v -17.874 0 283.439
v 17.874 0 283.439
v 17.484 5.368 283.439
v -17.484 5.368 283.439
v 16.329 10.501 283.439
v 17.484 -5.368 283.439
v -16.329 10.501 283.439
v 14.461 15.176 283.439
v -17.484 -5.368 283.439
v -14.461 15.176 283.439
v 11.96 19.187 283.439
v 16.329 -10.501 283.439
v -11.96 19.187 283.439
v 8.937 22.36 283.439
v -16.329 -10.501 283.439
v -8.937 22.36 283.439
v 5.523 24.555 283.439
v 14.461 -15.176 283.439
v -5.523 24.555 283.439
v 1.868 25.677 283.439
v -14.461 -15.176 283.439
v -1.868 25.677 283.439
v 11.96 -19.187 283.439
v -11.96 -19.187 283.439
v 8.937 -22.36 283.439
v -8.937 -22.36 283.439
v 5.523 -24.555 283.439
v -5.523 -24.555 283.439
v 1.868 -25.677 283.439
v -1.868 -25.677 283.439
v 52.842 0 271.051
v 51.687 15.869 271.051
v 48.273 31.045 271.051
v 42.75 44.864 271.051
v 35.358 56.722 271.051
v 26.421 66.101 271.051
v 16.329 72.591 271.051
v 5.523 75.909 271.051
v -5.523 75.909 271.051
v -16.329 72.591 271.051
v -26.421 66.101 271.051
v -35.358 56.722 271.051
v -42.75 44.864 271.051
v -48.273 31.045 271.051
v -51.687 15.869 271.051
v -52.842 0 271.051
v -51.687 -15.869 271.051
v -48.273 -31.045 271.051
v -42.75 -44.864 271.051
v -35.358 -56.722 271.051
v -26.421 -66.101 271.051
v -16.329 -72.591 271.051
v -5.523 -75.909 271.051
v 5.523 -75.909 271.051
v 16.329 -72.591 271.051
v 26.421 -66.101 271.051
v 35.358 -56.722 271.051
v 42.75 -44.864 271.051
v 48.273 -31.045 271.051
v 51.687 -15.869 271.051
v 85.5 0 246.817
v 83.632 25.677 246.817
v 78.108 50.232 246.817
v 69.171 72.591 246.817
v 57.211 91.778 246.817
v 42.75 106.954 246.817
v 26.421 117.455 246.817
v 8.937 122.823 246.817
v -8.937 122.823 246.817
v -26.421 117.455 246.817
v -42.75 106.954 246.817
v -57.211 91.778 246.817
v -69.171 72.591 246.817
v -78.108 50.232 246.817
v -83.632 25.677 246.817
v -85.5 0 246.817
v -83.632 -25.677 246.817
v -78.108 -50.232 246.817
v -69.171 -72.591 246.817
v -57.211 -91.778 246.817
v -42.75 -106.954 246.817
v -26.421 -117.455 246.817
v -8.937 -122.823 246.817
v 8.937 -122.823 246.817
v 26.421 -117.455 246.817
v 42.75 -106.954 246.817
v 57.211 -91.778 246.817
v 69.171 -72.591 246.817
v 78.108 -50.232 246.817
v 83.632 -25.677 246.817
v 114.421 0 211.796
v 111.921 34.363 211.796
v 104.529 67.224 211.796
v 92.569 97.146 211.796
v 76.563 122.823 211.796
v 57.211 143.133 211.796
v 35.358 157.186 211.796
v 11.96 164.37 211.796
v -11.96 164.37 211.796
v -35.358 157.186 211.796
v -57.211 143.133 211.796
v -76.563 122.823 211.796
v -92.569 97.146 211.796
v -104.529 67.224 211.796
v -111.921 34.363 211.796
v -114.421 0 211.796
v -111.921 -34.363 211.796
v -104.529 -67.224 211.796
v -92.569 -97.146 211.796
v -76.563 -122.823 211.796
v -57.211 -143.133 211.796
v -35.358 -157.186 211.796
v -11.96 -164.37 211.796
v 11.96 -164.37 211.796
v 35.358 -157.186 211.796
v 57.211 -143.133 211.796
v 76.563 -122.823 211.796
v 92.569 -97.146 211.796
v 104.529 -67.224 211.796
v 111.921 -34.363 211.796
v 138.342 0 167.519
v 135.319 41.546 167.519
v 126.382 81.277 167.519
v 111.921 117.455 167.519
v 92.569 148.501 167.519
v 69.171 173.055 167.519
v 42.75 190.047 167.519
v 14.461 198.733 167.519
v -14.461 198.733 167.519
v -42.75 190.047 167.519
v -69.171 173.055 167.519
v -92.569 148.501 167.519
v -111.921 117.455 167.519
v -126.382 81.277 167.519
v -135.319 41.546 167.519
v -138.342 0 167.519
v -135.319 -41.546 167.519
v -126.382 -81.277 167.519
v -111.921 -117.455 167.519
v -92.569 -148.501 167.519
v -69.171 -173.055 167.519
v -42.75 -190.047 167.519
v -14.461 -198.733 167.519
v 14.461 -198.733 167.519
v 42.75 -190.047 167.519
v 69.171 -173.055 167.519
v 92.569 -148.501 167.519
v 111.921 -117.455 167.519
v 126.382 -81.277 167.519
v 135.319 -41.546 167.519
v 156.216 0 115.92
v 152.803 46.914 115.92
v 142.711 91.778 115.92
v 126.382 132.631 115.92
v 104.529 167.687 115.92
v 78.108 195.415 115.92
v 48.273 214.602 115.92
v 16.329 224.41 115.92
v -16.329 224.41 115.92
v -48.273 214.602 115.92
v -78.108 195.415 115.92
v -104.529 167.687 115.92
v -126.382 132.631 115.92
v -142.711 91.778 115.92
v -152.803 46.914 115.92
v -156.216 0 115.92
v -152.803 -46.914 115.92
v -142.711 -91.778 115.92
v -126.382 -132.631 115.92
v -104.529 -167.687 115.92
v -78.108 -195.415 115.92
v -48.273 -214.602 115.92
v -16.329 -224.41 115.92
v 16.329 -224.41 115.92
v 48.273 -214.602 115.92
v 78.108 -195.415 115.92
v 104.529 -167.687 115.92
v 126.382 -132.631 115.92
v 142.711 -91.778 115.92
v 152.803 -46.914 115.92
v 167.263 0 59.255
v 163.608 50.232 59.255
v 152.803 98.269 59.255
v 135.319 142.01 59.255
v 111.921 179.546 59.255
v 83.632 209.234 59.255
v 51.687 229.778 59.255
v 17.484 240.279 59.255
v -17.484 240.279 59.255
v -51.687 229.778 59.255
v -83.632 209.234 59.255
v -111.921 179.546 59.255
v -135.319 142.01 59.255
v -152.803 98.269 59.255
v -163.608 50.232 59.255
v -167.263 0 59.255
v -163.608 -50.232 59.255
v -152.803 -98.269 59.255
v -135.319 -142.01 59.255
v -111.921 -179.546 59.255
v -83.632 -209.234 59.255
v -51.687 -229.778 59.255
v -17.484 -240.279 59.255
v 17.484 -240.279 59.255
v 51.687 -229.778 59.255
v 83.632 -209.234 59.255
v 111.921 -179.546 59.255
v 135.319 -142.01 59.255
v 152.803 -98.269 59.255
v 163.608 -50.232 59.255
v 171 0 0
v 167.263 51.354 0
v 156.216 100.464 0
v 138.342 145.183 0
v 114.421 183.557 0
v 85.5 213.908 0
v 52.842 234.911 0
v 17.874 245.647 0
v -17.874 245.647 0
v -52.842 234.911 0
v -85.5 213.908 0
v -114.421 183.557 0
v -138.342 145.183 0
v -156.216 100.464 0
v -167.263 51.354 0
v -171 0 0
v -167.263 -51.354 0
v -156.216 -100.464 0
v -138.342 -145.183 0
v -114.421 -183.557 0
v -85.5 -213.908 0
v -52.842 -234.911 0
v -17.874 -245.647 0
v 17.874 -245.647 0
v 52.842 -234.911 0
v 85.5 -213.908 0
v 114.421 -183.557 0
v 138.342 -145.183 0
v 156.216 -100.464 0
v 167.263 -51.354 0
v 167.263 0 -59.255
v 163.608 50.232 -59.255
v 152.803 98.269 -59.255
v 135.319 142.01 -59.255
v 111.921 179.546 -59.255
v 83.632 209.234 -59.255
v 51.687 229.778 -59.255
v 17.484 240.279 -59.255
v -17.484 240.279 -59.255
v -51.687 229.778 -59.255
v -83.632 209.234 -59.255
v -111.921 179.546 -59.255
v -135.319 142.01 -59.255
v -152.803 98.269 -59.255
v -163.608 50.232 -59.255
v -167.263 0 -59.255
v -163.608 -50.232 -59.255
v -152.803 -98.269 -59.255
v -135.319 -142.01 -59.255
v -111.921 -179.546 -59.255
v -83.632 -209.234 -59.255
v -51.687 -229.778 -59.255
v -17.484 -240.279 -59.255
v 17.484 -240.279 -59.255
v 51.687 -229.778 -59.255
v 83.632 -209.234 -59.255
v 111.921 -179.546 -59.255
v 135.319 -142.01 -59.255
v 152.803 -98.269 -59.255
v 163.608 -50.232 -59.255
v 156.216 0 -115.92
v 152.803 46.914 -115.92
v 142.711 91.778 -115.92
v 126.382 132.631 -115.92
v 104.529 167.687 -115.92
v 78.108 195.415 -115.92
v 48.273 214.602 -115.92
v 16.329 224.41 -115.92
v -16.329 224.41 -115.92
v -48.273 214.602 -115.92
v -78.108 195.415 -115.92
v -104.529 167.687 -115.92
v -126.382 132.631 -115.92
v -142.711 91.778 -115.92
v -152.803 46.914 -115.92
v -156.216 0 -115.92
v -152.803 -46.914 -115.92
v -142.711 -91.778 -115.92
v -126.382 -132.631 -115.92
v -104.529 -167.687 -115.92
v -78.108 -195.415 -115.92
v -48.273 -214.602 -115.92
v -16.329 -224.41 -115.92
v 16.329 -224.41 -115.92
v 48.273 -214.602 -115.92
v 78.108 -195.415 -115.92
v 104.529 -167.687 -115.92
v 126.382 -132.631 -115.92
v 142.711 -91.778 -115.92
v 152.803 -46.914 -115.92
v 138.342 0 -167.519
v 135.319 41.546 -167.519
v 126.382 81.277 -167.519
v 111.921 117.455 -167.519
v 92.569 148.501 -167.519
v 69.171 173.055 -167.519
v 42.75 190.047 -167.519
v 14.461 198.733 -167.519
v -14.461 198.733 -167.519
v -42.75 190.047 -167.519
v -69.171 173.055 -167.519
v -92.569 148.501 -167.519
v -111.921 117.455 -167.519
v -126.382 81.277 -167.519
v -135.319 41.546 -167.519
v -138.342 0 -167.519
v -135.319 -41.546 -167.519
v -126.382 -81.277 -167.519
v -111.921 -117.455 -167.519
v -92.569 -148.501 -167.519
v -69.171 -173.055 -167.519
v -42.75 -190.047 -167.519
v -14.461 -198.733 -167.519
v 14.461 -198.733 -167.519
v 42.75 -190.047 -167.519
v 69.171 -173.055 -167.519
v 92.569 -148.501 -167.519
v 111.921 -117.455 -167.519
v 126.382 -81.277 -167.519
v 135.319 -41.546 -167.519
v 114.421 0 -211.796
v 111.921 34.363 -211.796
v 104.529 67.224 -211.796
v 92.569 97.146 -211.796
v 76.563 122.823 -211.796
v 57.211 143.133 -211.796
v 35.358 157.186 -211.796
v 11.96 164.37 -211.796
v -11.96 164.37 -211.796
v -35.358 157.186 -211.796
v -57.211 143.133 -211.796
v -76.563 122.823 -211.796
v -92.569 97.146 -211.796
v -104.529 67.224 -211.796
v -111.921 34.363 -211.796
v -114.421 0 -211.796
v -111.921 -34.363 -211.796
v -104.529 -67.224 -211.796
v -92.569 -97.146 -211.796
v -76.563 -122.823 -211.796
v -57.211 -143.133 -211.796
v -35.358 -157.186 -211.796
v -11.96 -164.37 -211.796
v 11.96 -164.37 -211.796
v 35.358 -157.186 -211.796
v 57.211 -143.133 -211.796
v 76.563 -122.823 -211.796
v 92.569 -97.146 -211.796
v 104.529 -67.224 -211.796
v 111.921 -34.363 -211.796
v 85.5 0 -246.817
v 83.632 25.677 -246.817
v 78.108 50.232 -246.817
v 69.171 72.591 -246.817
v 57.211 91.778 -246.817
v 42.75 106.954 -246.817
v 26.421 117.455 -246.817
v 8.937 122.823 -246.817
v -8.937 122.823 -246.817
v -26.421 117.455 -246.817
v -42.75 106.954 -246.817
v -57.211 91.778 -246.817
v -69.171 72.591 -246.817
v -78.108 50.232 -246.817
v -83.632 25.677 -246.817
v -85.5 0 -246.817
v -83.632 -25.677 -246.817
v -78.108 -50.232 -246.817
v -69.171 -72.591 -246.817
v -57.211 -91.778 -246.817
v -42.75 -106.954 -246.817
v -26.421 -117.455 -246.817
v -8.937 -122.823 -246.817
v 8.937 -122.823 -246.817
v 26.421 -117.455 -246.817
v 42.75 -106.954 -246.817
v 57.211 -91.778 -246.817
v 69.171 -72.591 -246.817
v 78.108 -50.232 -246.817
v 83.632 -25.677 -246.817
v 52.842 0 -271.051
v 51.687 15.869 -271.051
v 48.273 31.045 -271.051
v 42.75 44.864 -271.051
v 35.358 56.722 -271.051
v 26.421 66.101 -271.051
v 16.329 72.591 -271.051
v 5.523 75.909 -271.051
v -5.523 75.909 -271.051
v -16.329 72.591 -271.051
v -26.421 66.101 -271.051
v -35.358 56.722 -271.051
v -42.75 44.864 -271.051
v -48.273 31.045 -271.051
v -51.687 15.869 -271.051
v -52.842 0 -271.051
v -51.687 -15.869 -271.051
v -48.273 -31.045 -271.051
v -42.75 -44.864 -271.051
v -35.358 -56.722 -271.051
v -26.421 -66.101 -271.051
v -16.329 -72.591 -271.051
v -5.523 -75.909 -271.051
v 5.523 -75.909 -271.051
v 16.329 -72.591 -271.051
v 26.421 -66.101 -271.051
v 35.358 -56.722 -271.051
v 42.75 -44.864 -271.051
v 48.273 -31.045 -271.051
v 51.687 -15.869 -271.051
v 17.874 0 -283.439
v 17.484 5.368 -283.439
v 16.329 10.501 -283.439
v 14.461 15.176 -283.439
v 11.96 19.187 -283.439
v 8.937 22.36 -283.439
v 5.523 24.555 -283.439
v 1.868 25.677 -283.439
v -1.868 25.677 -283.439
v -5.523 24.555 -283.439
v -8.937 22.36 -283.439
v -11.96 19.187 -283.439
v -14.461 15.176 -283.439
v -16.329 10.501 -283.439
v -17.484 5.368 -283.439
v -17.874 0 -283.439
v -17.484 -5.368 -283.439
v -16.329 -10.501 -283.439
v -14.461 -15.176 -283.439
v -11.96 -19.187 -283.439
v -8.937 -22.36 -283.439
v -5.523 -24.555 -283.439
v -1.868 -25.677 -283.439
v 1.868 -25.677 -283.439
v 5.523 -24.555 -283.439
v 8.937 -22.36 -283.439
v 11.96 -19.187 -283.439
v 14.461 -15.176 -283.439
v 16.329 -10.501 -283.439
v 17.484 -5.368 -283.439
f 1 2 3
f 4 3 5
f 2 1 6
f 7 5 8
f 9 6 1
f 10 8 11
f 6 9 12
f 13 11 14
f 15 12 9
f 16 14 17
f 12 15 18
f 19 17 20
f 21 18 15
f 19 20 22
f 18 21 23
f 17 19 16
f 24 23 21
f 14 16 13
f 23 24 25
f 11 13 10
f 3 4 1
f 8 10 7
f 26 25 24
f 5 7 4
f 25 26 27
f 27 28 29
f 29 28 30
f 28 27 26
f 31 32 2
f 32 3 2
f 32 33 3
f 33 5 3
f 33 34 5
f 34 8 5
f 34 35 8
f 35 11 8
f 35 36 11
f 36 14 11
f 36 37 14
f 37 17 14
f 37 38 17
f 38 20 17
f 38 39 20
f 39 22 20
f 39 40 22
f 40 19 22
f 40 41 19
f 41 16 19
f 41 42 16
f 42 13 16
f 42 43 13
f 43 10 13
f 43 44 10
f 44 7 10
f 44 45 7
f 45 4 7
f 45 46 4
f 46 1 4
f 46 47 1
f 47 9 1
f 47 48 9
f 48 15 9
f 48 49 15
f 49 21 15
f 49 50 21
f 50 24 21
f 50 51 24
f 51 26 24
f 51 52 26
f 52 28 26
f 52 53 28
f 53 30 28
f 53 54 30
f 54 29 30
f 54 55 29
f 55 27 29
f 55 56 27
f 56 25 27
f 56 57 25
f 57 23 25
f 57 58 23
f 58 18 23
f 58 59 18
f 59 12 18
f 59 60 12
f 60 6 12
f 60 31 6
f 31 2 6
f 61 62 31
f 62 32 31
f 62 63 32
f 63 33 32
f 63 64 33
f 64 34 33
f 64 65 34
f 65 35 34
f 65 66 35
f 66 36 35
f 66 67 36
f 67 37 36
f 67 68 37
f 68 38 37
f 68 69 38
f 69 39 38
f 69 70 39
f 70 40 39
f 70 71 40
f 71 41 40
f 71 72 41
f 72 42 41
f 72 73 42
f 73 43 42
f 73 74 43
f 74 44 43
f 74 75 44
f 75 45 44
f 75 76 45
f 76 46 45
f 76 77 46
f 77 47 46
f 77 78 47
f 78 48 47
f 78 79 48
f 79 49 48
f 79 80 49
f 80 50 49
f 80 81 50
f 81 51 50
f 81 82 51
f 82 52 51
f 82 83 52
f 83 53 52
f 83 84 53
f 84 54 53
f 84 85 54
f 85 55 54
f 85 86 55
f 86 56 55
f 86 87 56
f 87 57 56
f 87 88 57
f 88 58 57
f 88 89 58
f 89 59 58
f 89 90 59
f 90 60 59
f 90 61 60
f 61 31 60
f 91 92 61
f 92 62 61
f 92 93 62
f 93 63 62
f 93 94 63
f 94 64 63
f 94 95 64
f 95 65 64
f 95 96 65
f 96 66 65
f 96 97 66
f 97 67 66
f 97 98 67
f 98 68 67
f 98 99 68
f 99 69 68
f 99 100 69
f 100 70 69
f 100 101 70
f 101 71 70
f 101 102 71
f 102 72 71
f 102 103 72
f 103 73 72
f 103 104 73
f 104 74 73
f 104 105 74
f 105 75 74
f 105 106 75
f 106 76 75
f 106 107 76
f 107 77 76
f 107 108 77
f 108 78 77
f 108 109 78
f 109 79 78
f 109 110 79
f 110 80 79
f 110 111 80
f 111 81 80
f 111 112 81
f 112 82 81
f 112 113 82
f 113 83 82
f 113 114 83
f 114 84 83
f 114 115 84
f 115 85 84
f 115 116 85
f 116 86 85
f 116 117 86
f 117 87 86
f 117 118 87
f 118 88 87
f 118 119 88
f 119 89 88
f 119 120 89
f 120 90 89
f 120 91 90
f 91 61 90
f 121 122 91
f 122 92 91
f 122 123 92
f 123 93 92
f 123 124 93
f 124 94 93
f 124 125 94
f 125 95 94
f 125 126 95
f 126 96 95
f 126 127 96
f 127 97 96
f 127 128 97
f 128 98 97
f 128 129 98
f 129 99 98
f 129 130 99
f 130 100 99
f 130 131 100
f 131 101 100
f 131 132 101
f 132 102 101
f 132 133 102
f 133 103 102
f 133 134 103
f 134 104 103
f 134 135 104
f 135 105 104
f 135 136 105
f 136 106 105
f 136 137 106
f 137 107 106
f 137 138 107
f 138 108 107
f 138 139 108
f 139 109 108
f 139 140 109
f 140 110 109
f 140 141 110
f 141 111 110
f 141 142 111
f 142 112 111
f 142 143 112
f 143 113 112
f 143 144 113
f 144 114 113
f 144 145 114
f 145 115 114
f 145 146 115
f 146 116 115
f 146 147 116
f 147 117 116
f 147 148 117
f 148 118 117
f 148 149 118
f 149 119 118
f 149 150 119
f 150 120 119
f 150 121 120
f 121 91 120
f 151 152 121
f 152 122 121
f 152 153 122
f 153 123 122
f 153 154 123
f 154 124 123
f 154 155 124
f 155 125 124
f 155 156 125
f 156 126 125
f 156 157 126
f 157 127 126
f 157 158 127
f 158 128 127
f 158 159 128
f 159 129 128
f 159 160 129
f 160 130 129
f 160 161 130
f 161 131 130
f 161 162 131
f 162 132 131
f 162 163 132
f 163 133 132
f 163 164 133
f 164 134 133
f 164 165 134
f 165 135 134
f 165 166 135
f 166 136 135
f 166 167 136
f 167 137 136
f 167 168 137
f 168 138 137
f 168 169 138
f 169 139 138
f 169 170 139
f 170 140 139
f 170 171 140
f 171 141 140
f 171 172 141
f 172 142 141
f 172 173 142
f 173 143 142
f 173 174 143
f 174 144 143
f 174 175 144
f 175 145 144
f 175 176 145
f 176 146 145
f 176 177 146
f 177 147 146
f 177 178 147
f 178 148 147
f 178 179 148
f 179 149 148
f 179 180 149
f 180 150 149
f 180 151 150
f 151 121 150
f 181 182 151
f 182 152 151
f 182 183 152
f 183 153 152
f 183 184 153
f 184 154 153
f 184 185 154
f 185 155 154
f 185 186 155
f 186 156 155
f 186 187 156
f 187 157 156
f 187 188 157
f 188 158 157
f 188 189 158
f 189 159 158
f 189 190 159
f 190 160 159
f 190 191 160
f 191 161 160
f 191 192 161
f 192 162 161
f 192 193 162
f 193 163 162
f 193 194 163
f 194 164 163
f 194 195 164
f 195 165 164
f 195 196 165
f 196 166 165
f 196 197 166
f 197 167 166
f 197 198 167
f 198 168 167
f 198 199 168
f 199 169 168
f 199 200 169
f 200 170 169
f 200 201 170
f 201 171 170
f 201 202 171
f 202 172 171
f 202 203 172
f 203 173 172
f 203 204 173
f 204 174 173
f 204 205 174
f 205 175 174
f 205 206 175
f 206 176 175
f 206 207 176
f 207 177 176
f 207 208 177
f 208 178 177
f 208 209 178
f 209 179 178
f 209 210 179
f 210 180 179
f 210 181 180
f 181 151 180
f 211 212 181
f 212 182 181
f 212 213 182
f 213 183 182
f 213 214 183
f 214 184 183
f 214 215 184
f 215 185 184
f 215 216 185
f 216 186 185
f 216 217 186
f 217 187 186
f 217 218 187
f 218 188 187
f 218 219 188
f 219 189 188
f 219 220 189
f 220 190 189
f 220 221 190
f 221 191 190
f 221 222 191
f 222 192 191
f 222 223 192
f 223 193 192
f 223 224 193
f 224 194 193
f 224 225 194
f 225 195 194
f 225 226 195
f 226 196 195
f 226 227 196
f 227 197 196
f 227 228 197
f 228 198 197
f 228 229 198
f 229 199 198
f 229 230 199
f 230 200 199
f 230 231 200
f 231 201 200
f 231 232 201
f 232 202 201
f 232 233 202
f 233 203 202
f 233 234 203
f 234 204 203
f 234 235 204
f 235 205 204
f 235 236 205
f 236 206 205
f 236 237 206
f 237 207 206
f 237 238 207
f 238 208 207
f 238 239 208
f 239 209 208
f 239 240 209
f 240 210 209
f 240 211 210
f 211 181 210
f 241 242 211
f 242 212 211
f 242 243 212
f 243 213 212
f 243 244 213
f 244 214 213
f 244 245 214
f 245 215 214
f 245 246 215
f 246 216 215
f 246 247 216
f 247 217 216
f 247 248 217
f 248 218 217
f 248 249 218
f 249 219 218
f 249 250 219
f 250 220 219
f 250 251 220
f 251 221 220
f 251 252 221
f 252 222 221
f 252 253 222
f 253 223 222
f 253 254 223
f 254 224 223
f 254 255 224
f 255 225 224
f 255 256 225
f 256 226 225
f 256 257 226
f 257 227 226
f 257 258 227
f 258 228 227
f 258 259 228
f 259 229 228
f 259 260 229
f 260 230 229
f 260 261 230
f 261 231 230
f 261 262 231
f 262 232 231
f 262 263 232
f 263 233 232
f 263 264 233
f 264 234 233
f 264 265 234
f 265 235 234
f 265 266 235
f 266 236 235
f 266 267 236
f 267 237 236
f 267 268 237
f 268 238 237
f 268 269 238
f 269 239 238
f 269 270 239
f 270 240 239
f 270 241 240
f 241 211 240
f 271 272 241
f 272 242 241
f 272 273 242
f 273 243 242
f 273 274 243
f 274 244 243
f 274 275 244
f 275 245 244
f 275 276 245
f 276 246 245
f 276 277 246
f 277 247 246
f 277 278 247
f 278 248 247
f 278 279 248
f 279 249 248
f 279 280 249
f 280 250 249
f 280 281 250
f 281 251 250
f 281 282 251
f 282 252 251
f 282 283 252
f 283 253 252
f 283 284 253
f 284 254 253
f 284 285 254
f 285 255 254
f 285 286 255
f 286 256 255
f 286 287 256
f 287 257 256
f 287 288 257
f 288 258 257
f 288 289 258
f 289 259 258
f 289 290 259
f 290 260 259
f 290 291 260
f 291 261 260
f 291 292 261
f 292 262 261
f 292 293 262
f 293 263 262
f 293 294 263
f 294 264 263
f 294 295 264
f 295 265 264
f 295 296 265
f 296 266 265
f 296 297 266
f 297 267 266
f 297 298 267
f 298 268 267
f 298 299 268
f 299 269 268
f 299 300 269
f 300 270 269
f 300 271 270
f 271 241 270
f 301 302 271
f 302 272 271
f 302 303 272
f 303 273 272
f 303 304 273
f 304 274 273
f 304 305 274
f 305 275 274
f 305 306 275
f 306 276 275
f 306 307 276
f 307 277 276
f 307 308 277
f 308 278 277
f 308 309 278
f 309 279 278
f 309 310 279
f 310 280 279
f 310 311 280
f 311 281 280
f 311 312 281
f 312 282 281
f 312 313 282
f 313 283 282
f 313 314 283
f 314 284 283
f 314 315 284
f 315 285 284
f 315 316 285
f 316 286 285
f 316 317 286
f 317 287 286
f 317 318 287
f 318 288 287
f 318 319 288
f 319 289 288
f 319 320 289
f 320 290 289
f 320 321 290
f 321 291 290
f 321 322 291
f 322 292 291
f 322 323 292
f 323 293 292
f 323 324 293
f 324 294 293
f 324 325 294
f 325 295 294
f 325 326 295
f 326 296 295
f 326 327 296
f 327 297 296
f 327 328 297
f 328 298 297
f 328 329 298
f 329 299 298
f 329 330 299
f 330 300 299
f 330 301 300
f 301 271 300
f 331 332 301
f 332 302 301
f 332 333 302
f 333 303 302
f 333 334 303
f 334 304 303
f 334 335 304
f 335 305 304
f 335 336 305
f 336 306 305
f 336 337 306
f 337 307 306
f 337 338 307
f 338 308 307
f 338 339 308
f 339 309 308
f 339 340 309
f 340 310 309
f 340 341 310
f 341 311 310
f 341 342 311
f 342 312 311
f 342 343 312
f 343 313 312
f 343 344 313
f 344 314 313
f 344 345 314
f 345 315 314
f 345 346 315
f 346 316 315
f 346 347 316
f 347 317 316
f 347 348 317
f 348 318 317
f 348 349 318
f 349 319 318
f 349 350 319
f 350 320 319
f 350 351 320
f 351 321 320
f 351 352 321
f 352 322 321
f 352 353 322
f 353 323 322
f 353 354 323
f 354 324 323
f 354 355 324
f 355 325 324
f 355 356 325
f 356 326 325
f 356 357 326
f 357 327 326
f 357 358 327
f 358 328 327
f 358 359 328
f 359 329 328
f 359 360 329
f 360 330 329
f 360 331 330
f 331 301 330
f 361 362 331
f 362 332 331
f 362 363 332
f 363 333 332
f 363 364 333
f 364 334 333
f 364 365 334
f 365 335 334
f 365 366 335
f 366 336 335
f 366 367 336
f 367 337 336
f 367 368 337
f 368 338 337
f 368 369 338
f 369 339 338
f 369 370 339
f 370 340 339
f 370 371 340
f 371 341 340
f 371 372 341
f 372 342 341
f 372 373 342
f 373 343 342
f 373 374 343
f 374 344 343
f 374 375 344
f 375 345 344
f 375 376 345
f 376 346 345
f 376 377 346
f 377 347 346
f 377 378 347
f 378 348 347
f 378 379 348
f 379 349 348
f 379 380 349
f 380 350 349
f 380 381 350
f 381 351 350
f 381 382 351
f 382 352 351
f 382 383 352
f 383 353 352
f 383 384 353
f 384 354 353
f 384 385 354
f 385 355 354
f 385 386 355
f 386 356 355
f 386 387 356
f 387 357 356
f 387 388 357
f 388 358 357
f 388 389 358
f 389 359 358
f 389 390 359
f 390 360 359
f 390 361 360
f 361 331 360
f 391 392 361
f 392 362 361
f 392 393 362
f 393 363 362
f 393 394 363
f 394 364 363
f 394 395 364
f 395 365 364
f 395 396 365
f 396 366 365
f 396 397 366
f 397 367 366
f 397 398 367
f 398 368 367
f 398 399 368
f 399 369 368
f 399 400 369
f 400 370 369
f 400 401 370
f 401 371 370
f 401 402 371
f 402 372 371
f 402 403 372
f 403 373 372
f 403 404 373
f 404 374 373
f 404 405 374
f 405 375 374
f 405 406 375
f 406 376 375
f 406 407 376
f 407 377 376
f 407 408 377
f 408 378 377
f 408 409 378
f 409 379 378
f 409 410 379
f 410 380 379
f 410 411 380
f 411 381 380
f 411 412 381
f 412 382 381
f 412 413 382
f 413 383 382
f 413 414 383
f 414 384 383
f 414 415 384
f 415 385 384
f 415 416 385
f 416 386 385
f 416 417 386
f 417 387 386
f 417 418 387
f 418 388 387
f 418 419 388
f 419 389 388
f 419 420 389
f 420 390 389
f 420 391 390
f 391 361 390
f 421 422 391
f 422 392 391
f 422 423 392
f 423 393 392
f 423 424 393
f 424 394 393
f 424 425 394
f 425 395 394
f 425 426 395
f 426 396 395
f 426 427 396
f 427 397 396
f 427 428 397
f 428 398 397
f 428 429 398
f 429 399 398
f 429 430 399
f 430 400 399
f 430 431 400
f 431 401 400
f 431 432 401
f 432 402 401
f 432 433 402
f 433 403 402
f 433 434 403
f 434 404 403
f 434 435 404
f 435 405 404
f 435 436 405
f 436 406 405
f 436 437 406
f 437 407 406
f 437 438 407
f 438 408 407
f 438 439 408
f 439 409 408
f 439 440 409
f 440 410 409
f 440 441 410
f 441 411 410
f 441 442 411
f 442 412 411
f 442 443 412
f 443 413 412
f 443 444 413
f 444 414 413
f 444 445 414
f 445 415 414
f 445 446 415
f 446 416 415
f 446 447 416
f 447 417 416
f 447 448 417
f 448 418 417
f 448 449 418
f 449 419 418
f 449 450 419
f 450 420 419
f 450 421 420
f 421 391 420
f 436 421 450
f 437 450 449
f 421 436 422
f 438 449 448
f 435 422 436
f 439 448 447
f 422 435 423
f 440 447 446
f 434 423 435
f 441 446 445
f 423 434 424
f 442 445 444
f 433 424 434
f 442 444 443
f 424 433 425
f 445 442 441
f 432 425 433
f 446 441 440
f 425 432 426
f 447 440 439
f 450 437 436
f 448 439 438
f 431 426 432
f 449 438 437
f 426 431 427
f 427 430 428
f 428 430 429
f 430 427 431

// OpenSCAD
// Generated by SolidPython 1.0.1 on 2020-07-29 00:39:26


scale(v = [9, 13, 15]) {
	sphere(r = 19);
}
/***********************************************
*********      SolidPython code:      **********
************************************************
 
# import packages: SolidPython
from solid import *
from solid.utils import *
from itertools import chain, combinations


class Resize:

    def __init__(self, scad_file):
        self.scad_file = scad_file
        #self.scad_file = import_scad(scad_file)
        # cone/cylinder param:
        self.r1 = 0
        self.r2 = 0
        self.h = 0
        # rectangular prism param:
        self.w = 0
        self.l = 0
        # ellipse param:
        self.r = 0

    # import OpenScad code (file name corresponds to shape)


    # classify shape + parameters
    def assign(self, param1, param2, param3):
        if self.scad_file == 'cone.scad':
            self.r1 = param1
            self.r2 = param2
            self.h = param3
        elif self.scad_file == 'cylinder.scad':
            self.r1 = param1
            self.r2 = param2
            self.h = param3
        elif self.scad_file == 'rectangularPrism.scad':
            self.h = param1
            self.l = param2
            self.w = param3
        else:
            self.r = param1
            self.h = param2

    # resize parameters
    def iterate(self):
        x = range(3, 20, 2)
        i = 1
        if self.scad_file == 'cone.scad':
            tempList = list(combinations(x, 2))
            for temp in tempList:
                param1 = temp[0]
                param2 = temp[1]
                filepath = 'produced_scad_files/' + 'cone' + str(param1) + '_' + str(param2) + '_' + '.scad'
                scad_render_to_file(cylinder(h=param1, r1=param2, r2=0), filepath)

        elif self.scad_file == 'cylinder.scad':
            tempList = list(combinations(x, 3))
            for temp in tempList:
                param1 = temp[0]
                param2 = temp[1]
                filepath = 'produced_scad_files/' + 'cylinder' + str(param1) + '_' + str(param2) + '_' + '.scad'
                scad_render_to_file(cylinder(h=param1, r1=param2, r2=param2), filepath)

        elif self.scad_file == 'rectangularPrism.scad':
            tempList = list(combinations(x, 3))
            for temp in tempList:
                param1 = temp[0]
                param2 = temp[1]
                param3 = temp[2]
                filepath = 'produced_scad_files/' + 'rectangularPrism' + str(param1) + '_' + str(param2) + '_' + str(
                    param3) + '.scad'
                scad_render_to_file(cube(size=(param1, param2, param3)), filepath)

        elif self.scad_file == 'ellipse.scad':
            tempList = list(combinations(x, 4))
            for temp in tempList:
                param1 = temp[0]
                param2 = temp[1]
                param3 = temp[2]
                param4 = temp[3]
                filepath = 'produced_scad_files/' + 'ellipse' + str(param1) + '_' + str(param2) + '_' + str(param3) + '_' + str(param4) + '.scad'
                scad_render_to_file(scale([param1, param2, param3])(sphere(r=param4)), filepath)

    def render_to_scadfile(self):
        scad_render_to_file(scad, 'example.scad') 
 
************************************************/
